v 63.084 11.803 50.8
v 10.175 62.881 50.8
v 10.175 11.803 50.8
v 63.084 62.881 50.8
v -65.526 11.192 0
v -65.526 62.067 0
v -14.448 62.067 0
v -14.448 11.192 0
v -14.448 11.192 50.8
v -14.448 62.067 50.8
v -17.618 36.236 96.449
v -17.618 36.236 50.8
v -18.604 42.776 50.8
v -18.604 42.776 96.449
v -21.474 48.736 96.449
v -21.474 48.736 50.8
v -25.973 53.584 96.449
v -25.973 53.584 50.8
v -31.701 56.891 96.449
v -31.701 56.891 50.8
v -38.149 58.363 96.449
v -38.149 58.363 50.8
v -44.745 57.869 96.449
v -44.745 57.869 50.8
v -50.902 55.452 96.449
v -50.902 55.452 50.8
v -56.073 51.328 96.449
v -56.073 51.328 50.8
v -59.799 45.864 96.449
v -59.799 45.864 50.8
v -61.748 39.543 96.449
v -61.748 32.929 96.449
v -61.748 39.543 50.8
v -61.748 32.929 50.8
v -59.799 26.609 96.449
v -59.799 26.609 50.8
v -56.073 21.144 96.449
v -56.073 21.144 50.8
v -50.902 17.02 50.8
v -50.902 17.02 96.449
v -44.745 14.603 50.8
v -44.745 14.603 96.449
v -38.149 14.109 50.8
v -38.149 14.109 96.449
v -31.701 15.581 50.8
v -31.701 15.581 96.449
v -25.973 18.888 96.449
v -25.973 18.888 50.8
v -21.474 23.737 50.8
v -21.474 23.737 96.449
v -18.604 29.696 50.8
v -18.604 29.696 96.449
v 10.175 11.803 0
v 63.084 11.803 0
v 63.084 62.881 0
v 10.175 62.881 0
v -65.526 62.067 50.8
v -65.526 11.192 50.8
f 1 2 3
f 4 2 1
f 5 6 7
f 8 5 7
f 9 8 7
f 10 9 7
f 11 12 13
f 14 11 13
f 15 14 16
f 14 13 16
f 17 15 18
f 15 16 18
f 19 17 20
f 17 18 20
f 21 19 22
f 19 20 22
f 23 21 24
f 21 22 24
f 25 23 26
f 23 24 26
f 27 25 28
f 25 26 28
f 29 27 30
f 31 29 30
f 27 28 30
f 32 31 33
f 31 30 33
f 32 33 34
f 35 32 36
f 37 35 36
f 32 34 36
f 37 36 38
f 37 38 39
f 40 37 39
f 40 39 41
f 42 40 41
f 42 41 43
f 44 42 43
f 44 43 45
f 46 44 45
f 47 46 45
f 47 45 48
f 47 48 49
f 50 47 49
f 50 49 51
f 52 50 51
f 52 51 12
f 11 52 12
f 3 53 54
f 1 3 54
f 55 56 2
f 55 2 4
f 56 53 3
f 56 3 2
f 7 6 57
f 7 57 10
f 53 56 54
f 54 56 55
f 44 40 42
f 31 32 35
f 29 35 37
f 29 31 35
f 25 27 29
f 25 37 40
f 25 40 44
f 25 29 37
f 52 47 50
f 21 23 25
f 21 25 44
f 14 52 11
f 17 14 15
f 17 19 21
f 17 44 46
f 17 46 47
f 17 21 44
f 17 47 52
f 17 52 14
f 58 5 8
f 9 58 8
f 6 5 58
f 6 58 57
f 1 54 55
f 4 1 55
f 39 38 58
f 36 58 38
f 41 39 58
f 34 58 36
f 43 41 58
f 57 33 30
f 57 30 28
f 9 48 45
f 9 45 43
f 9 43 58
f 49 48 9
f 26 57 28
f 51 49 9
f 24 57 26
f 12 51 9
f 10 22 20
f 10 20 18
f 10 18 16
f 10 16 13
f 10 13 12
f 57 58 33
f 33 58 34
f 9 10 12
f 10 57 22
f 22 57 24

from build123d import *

# Parameters (mm, degrees)
F1_W     = 51.077709
F1_H     = 50.874226
F3_DEPTH = 50.8
F2_R     = 22.188972
F4_DEPTH = 96.448861
F0_W     = 52.909196
F0_H     = 51.077716
F5_DEPTH = 50.8


with BuildPart() as f3:
    # F1 (on Top) → F3 (new body)
    with BuildSketch(Plane.XY):
        with Locations((-39.98711, 36.629435)):
            Rectangle(F1_W, F1_H)
    extrude(amount=F3_DEPTH)

    # F2 (on face) → F4 (join)
    with BuildSketch(Plane.XY):
        with Locations((-39.807215, 36.236107)):
            Circle(F2_R)
    extrude(amount=F4_DEPTH)


with BuildPart() as f5:
    # F0 (on Top) → F5 (new body)
    with BuildSketch(Plane.XY):
        with Locations((36.629468, 37.34168)):
            Rectangle(F0_W, F0_H)
    extrude(amount=F5_DEPTH)


solid = Compound([f3.part, f5.part])
